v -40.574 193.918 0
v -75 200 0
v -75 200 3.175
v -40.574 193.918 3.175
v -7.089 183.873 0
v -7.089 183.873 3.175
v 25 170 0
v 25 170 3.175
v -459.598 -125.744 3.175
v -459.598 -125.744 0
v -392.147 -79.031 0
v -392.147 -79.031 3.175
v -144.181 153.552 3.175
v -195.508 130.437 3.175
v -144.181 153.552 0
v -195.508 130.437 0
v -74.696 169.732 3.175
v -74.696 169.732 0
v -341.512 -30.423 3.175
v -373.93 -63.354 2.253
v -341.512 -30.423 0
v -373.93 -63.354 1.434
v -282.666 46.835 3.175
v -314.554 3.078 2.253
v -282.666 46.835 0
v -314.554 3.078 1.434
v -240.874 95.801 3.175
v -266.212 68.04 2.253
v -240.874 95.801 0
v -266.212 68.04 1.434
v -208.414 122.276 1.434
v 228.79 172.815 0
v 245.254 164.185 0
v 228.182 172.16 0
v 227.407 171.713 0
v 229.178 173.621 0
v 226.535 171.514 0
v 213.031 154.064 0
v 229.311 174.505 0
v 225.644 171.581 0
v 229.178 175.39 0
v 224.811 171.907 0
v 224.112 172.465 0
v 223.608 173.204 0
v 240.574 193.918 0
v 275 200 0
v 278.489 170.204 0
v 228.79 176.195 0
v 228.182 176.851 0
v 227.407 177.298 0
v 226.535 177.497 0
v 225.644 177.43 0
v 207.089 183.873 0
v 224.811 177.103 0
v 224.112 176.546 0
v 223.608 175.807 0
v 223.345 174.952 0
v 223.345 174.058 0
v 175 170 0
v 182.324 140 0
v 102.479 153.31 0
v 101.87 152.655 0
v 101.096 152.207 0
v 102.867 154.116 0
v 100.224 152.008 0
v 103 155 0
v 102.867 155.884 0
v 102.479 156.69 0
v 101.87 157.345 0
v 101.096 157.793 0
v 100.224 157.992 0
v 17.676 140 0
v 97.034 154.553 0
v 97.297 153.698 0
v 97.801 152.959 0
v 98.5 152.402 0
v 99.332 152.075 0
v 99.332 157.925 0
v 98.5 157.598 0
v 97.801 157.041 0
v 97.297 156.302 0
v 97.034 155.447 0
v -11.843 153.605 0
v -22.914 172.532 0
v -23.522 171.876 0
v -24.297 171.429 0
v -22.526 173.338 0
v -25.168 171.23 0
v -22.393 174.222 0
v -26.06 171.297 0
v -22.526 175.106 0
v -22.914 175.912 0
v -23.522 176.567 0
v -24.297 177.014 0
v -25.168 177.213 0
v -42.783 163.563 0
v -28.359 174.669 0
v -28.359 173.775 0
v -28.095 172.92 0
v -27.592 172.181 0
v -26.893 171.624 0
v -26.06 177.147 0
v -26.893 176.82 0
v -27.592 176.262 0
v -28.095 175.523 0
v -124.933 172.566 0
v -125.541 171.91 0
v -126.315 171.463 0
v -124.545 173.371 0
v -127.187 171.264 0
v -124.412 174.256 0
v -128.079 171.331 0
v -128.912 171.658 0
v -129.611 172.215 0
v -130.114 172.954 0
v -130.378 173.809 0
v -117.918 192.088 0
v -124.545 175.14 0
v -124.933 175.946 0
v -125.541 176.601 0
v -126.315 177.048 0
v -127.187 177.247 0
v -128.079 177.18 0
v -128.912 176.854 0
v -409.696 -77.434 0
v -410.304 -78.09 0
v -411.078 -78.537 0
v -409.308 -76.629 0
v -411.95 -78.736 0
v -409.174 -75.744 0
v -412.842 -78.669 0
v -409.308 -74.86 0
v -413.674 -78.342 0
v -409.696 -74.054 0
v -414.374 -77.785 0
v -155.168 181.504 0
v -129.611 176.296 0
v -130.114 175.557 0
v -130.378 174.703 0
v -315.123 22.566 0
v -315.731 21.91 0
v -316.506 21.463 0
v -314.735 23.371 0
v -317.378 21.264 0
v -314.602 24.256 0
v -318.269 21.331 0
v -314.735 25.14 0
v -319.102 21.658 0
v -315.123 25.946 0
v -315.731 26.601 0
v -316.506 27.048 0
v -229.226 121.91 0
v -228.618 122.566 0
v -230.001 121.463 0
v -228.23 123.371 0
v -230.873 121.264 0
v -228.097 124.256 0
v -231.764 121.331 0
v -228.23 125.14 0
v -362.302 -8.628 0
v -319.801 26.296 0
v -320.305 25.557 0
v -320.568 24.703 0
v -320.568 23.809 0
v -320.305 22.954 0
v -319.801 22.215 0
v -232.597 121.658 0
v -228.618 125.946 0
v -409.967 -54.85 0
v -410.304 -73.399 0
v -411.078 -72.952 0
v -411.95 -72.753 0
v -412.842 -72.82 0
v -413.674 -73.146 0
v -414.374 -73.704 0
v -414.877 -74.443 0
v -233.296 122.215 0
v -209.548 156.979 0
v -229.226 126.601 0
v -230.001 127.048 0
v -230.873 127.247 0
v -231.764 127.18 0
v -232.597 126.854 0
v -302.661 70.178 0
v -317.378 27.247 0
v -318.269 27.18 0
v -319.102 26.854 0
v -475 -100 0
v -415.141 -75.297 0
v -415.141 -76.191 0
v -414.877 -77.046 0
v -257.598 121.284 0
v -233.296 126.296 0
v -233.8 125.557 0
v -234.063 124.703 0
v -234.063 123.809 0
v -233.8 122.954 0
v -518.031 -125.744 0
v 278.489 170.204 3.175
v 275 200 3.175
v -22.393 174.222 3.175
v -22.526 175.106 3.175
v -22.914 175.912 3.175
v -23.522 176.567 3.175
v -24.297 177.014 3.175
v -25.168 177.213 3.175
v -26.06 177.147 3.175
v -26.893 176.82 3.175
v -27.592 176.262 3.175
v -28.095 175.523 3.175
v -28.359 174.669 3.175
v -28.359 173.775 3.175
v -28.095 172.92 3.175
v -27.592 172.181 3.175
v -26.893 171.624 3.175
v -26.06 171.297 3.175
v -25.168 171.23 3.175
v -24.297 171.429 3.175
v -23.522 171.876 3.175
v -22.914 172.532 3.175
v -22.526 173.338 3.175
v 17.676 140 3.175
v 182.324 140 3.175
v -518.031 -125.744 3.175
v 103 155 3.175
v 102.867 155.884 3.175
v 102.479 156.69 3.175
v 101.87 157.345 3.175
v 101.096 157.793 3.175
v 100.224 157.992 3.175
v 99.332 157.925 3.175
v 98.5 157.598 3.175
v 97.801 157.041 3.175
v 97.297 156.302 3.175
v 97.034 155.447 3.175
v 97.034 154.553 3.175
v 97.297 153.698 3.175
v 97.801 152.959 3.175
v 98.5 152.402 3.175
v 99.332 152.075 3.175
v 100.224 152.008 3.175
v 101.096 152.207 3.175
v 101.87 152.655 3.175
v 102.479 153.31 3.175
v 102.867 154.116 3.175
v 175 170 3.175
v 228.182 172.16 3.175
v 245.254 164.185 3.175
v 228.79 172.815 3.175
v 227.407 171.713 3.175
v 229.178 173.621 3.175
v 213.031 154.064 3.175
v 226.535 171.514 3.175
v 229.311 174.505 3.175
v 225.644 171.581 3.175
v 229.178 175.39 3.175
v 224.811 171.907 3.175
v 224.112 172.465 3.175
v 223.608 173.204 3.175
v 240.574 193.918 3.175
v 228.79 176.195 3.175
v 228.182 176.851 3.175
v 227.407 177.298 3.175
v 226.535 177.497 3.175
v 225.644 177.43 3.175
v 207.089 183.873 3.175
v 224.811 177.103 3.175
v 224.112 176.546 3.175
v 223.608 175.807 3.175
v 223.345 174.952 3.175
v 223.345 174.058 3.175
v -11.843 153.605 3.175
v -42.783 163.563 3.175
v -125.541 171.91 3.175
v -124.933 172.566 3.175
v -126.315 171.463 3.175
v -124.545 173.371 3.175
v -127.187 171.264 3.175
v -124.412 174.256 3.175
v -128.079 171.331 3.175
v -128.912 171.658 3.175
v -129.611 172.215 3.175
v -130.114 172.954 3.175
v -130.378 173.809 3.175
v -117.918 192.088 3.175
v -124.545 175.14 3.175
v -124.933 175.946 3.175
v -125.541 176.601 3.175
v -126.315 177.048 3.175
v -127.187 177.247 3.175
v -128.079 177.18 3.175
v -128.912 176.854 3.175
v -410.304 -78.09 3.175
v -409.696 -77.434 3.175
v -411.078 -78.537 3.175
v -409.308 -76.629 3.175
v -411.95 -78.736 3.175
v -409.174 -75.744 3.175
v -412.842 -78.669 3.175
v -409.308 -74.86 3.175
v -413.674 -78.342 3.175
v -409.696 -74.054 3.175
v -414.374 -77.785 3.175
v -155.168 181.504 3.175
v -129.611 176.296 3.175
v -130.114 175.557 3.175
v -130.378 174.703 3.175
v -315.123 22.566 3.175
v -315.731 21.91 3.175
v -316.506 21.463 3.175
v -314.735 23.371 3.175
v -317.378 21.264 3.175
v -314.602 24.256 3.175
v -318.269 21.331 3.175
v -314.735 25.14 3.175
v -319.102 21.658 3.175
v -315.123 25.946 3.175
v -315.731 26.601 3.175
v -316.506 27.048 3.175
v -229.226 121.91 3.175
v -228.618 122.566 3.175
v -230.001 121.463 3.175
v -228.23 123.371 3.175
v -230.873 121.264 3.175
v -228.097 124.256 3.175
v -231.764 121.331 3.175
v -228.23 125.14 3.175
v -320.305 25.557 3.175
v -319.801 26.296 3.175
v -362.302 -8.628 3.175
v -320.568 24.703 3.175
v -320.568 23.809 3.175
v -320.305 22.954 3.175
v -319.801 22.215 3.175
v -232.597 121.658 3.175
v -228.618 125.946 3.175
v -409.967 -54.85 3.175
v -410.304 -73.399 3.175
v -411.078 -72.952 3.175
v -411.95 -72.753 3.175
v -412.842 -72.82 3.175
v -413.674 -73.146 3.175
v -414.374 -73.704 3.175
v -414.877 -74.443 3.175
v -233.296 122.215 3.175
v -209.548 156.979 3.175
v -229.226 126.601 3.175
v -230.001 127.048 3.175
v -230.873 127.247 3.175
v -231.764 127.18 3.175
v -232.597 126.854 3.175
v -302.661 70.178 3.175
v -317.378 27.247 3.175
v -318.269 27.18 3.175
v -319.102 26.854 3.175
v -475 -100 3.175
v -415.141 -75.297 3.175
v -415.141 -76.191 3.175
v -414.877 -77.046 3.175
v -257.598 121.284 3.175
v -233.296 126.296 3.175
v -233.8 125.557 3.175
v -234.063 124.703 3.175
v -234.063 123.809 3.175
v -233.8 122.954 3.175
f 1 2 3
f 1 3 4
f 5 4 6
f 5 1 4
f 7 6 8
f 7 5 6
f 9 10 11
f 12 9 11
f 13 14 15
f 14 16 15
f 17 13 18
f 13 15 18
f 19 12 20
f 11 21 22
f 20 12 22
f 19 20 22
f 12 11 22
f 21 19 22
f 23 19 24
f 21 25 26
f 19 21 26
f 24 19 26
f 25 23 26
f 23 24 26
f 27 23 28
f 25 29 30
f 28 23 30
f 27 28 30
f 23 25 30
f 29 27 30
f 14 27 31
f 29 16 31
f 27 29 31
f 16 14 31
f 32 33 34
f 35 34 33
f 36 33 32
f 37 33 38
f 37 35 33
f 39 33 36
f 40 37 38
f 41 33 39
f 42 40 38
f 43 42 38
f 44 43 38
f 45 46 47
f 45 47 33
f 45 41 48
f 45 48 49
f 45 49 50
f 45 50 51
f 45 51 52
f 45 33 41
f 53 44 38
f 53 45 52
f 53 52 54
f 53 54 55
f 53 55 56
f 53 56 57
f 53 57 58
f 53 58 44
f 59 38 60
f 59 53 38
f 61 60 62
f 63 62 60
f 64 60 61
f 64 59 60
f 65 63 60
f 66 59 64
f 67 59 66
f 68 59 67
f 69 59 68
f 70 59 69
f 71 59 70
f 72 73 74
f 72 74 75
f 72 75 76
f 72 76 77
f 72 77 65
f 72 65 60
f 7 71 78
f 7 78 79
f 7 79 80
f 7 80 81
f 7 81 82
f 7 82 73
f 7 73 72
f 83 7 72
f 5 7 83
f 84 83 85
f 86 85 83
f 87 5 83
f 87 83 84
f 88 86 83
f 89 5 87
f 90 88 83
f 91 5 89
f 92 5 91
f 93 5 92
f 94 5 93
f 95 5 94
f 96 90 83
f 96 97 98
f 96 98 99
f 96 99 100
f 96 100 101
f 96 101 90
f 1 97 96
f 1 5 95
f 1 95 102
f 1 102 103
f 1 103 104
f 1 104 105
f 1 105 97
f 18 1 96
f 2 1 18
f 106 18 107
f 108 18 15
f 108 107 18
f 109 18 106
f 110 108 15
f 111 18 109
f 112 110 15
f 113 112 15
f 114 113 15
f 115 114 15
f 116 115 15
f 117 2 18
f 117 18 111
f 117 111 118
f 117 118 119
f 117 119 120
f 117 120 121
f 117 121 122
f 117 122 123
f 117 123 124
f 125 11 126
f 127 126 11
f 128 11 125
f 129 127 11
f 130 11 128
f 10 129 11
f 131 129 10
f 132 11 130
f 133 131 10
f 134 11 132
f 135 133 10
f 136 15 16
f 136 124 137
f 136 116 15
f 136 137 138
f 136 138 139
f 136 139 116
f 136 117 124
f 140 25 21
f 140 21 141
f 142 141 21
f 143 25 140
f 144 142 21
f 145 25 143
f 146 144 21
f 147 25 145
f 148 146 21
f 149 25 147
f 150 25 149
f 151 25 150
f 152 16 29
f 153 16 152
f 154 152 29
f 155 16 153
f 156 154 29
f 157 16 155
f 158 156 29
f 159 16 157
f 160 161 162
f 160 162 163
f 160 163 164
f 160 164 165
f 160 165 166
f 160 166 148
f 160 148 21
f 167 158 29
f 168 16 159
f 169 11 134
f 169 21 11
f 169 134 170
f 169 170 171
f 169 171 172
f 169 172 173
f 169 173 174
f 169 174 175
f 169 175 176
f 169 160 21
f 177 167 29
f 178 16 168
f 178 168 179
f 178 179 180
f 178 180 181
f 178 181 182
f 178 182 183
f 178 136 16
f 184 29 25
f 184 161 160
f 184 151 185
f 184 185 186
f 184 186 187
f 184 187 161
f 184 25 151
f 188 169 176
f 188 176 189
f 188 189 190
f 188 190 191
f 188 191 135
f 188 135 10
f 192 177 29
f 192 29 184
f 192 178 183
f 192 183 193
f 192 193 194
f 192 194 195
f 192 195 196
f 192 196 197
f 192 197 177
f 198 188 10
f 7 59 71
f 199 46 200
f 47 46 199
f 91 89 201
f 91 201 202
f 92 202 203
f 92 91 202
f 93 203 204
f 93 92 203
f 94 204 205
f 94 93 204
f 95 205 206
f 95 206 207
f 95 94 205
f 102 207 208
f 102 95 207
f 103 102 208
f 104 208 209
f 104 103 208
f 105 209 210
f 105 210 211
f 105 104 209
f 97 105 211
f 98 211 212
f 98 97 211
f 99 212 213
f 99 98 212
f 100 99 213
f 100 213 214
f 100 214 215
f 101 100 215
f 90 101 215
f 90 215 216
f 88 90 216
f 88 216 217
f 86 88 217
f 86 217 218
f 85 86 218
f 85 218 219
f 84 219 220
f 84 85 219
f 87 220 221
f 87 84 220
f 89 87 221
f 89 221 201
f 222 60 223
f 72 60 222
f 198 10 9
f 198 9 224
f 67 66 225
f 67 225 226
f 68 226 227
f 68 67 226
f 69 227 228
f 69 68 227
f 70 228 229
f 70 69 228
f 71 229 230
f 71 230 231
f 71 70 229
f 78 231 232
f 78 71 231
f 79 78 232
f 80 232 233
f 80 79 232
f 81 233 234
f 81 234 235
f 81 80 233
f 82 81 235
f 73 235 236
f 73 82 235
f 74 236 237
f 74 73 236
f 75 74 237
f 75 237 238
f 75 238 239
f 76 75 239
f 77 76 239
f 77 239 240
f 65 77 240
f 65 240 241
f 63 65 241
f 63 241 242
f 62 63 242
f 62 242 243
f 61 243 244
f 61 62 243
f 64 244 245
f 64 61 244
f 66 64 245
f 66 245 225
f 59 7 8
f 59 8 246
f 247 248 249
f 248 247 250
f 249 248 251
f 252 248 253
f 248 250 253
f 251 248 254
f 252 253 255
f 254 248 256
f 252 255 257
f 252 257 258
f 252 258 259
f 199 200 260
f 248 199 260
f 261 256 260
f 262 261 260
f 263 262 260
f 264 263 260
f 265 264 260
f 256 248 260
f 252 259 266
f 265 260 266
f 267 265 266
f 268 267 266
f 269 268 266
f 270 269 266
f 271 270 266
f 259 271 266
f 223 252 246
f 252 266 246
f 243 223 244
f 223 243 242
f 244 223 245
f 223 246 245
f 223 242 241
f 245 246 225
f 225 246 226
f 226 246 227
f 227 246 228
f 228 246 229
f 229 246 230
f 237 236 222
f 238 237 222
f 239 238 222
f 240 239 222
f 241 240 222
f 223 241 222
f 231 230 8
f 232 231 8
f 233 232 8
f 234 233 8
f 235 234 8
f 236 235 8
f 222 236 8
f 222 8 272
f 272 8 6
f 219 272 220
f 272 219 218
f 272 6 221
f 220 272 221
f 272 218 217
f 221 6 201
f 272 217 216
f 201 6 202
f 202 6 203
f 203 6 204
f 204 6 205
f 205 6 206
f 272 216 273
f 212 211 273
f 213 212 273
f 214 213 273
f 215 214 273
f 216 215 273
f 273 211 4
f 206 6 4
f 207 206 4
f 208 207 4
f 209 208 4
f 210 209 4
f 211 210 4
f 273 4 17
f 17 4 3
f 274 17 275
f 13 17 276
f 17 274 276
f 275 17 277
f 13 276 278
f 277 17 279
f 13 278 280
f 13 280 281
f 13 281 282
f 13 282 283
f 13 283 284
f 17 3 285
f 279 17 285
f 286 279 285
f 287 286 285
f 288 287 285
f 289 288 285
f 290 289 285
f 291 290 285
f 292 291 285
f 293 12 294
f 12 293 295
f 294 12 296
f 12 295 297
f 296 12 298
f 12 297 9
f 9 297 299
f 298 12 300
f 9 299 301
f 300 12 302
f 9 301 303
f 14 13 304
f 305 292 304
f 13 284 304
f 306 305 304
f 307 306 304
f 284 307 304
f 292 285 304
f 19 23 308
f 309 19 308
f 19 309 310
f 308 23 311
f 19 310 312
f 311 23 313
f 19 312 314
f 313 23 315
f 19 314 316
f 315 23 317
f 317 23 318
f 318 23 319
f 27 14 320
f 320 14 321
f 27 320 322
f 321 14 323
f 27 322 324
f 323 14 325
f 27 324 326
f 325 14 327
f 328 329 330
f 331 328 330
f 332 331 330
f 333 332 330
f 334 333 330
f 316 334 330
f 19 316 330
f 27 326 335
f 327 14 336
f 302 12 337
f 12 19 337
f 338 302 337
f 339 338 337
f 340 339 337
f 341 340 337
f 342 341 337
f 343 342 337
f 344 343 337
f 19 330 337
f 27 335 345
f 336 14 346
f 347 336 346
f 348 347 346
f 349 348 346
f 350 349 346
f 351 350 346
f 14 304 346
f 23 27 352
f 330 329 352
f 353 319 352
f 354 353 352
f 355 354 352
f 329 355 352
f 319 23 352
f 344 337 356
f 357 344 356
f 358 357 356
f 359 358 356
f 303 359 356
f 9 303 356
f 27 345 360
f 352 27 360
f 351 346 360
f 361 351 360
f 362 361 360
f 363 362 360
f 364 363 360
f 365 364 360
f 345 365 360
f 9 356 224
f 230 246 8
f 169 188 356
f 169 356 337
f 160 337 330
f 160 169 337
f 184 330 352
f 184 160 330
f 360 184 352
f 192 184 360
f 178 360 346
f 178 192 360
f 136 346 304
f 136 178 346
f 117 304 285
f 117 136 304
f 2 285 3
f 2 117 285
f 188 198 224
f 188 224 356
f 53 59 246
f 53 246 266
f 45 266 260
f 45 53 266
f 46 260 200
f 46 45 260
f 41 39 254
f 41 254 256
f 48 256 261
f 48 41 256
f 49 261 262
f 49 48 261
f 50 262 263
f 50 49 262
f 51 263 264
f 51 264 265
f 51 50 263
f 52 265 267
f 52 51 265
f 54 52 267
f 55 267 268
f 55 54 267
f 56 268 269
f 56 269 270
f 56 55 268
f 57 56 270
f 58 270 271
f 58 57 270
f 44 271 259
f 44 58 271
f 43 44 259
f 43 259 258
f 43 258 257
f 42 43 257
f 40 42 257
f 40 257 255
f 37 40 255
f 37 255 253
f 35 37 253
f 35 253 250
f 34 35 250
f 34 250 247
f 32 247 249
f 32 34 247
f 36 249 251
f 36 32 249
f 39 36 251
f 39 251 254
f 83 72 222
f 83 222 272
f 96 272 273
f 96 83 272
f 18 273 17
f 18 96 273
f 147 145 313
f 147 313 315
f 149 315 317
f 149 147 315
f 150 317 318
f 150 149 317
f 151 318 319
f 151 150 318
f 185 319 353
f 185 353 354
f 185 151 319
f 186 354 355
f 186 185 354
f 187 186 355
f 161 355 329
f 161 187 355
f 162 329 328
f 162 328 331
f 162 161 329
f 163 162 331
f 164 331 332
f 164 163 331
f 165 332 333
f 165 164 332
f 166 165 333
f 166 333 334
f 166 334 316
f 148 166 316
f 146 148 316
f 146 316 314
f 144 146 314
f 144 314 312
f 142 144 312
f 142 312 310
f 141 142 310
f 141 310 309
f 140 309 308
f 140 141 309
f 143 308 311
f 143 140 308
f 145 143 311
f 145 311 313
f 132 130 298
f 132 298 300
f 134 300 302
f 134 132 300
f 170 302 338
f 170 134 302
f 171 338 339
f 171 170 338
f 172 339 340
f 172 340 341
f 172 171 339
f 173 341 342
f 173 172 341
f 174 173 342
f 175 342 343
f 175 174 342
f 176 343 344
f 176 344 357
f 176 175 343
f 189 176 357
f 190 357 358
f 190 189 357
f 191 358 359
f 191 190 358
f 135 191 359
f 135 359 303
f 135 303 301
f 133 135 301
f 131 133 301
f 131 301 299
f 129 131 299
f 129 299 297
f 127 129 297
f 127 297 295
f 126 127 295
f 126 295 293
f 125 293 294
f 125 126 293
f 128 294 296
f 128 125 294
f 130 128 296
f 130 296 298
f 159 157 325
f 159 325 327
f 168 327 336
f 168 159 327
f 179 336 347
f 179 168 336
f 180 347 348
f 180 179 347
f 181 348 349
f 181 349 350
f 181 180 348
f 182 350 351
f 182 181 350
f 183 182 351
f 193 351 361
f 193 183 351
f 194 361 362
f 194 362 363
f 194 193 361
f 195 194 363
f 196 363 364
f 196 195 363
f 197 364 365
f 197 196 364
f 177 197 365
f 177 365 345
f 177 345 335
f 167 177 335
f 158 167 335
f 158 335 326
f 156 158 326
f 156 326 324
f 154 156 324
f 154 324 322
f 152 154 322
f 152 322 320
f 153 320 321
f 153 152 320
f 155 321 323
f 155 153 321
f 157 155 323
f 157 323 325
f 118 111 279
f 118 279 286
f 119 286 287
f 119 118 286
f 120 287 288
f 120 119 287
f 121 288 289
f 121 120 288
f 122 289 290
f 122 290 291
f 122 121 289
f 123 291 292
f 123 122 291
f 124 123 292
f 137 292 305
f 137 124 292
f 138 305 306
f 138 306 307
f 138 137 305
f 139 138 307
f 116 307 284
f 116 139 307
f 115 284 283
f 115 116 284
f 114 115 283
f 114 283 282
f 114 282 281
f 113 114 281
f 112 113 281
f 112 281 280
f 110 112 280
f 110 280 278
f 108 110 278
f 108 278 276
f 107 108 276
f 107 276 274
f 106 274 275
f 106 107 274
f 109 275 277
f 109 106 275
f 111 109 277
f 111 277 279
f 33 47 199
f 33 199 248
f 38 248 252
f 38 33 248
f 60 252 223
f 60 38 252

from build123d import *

# Parameters (mm, degrees)
SKETCH1_R           = 3
BOSS_EXTRUDE1_DEPTH = 3.175


with BuildPart() as part:
    # Sketch1 → Boss-Extrude1 (new body)
    with BuildSketch(Plane.XY):
        with BuildLine():
            Line((25, 170), (175, 170))
            ThreePointArc((175, 170), (223.684930832, 189.383563894), (275, 200))
            Line((275, 200), (278.48892965, 170.203567833))
            ThreePointArc((278.48892965, 170.203567833), (228.984362684, 159.629140364), (182.323699215, 140))
            Line((182.323699215, 140), (17.676300785, 140))
            ThreePointArc((17.676300785, 140), (-27.163176857, 159.050053662), (-74.696057289, 169.732215313))
            add(Edge.make_bspline(
                [(-459.597813184, -125.74437106), (-458.167847661, -124.888859924), (-455.300989911, -123.160410804), (-449.693031194, -119.725805066), (-442.844497858, -115.430194443), (-434.897527213, -110.280573748), (-424.643042919, -103.410605598), (-412.446207366, -94.807407336), (-398.73286692, -84.425459971), (-385.875530014, -73.956655832), (-369.787206696, -59.850046206), (-355.152571956, -45.476802835), (-341.718077927, -30.784744771), (-332.160906415, -19.581186548), (-323.101555816, -8.241034683), (-311.630816912, 6.863649777), (-298.117522758, 25.605990916), (-282.395742384, 47.431562205), (-266.384320483, 68.25099024), (-249.34123977, 87.803395961), (-230.504956306, 105.928130356), (-212.601243201, 119.774018212), (-196.457396921, 130.048920131), (-183.303935629, 137.33205425), (-168.969219752, 144.162376514), (-153.317967868, 150.50005901), (-136.218766867, 156.296597686), (-120.658812709, 160.629761276), (-107.364076993, 163.767973943), (-96.958515184, 165.949209965), (-87.903435435, 167.618170459), (-80.445251901, 168.856738216), (-76.604810273, 169.448930821), (-74.696057289, 169.732215313)],
                knots=[0, 0, 0, 0, 0.007772041, 0.015544083, 0.031088165, 0.046632248, 0.06217633, 0.093264496, 0.124352661, 0.155440826, 0.186528991, 0.248705321, 0.279793487, 0.310881652, 0.341969817, 0.373057982, 0.435234312, 0.497410643, 0.559586973, 0.621763303, 0.683939634, 0.746115964, 0.777204129, 0.808292294, 0.83938046, 0.870468625, 0.90155679, 0.932644955, 0.948189038, 0.96373312, 0.979277203, 0.987049244, 0.994821285, 0.994821285, 0.994821285, 0.994821285], degree=3))
            Line((-459.597813184, -125.74437106), (-518.031074044, -125.74437106))
            Line((-518.031074044, -125.74437106), (-475, -100))
            add(Edge.make_bspline(
                [(-475, -100), (-419.540575809, -66.820070684), (-306.013905785, 34.036801702), (-257.635554762, 174.287094016), (-75, 200)],
                knots=[0, 0, 0, 0, 0.312223899, 1, 1, 1, 1], degree=3))
            ThreePointArc((-75, 200), (-23.684930832, 189.383563894), (25, 170))
        make_face()
        with Locations((-412.174499428, -75.74437106)):
            Circle(SKETCH1_R, mode=Mode.SUBTRACT)
        with Locations((-317.601811803, 24.25562894)):
            Circle(SKETCH1_R, mode=Mode.SUBTRACT)
        with Locations((-231.096695012, 124.25562894)):
            Circle(SKETCH1_R, mode=Mode.SUBTRACT)
        with Locations((-127.411512689, 174.25562894)):
            Circle(SKETCH1_R, mode=Mode.SUBTRACT)
        with Locations((100, 155)):
            Circle(SKETCH1_R, mode=Mode.SUBTRACT)
        with Locations((226.311251147, 174.505328628)):
            Circle(SKETCH1_R, mode=Mode.SUBTRACT)
        with Locations((-25.392583218, 174.221837866)):
            Circle(SKETCH1_R, mode=Mode.SUBTRACT)
    extrude(amount=BOSS_EXTRUDE1_DEPTH)


solid = part.part
